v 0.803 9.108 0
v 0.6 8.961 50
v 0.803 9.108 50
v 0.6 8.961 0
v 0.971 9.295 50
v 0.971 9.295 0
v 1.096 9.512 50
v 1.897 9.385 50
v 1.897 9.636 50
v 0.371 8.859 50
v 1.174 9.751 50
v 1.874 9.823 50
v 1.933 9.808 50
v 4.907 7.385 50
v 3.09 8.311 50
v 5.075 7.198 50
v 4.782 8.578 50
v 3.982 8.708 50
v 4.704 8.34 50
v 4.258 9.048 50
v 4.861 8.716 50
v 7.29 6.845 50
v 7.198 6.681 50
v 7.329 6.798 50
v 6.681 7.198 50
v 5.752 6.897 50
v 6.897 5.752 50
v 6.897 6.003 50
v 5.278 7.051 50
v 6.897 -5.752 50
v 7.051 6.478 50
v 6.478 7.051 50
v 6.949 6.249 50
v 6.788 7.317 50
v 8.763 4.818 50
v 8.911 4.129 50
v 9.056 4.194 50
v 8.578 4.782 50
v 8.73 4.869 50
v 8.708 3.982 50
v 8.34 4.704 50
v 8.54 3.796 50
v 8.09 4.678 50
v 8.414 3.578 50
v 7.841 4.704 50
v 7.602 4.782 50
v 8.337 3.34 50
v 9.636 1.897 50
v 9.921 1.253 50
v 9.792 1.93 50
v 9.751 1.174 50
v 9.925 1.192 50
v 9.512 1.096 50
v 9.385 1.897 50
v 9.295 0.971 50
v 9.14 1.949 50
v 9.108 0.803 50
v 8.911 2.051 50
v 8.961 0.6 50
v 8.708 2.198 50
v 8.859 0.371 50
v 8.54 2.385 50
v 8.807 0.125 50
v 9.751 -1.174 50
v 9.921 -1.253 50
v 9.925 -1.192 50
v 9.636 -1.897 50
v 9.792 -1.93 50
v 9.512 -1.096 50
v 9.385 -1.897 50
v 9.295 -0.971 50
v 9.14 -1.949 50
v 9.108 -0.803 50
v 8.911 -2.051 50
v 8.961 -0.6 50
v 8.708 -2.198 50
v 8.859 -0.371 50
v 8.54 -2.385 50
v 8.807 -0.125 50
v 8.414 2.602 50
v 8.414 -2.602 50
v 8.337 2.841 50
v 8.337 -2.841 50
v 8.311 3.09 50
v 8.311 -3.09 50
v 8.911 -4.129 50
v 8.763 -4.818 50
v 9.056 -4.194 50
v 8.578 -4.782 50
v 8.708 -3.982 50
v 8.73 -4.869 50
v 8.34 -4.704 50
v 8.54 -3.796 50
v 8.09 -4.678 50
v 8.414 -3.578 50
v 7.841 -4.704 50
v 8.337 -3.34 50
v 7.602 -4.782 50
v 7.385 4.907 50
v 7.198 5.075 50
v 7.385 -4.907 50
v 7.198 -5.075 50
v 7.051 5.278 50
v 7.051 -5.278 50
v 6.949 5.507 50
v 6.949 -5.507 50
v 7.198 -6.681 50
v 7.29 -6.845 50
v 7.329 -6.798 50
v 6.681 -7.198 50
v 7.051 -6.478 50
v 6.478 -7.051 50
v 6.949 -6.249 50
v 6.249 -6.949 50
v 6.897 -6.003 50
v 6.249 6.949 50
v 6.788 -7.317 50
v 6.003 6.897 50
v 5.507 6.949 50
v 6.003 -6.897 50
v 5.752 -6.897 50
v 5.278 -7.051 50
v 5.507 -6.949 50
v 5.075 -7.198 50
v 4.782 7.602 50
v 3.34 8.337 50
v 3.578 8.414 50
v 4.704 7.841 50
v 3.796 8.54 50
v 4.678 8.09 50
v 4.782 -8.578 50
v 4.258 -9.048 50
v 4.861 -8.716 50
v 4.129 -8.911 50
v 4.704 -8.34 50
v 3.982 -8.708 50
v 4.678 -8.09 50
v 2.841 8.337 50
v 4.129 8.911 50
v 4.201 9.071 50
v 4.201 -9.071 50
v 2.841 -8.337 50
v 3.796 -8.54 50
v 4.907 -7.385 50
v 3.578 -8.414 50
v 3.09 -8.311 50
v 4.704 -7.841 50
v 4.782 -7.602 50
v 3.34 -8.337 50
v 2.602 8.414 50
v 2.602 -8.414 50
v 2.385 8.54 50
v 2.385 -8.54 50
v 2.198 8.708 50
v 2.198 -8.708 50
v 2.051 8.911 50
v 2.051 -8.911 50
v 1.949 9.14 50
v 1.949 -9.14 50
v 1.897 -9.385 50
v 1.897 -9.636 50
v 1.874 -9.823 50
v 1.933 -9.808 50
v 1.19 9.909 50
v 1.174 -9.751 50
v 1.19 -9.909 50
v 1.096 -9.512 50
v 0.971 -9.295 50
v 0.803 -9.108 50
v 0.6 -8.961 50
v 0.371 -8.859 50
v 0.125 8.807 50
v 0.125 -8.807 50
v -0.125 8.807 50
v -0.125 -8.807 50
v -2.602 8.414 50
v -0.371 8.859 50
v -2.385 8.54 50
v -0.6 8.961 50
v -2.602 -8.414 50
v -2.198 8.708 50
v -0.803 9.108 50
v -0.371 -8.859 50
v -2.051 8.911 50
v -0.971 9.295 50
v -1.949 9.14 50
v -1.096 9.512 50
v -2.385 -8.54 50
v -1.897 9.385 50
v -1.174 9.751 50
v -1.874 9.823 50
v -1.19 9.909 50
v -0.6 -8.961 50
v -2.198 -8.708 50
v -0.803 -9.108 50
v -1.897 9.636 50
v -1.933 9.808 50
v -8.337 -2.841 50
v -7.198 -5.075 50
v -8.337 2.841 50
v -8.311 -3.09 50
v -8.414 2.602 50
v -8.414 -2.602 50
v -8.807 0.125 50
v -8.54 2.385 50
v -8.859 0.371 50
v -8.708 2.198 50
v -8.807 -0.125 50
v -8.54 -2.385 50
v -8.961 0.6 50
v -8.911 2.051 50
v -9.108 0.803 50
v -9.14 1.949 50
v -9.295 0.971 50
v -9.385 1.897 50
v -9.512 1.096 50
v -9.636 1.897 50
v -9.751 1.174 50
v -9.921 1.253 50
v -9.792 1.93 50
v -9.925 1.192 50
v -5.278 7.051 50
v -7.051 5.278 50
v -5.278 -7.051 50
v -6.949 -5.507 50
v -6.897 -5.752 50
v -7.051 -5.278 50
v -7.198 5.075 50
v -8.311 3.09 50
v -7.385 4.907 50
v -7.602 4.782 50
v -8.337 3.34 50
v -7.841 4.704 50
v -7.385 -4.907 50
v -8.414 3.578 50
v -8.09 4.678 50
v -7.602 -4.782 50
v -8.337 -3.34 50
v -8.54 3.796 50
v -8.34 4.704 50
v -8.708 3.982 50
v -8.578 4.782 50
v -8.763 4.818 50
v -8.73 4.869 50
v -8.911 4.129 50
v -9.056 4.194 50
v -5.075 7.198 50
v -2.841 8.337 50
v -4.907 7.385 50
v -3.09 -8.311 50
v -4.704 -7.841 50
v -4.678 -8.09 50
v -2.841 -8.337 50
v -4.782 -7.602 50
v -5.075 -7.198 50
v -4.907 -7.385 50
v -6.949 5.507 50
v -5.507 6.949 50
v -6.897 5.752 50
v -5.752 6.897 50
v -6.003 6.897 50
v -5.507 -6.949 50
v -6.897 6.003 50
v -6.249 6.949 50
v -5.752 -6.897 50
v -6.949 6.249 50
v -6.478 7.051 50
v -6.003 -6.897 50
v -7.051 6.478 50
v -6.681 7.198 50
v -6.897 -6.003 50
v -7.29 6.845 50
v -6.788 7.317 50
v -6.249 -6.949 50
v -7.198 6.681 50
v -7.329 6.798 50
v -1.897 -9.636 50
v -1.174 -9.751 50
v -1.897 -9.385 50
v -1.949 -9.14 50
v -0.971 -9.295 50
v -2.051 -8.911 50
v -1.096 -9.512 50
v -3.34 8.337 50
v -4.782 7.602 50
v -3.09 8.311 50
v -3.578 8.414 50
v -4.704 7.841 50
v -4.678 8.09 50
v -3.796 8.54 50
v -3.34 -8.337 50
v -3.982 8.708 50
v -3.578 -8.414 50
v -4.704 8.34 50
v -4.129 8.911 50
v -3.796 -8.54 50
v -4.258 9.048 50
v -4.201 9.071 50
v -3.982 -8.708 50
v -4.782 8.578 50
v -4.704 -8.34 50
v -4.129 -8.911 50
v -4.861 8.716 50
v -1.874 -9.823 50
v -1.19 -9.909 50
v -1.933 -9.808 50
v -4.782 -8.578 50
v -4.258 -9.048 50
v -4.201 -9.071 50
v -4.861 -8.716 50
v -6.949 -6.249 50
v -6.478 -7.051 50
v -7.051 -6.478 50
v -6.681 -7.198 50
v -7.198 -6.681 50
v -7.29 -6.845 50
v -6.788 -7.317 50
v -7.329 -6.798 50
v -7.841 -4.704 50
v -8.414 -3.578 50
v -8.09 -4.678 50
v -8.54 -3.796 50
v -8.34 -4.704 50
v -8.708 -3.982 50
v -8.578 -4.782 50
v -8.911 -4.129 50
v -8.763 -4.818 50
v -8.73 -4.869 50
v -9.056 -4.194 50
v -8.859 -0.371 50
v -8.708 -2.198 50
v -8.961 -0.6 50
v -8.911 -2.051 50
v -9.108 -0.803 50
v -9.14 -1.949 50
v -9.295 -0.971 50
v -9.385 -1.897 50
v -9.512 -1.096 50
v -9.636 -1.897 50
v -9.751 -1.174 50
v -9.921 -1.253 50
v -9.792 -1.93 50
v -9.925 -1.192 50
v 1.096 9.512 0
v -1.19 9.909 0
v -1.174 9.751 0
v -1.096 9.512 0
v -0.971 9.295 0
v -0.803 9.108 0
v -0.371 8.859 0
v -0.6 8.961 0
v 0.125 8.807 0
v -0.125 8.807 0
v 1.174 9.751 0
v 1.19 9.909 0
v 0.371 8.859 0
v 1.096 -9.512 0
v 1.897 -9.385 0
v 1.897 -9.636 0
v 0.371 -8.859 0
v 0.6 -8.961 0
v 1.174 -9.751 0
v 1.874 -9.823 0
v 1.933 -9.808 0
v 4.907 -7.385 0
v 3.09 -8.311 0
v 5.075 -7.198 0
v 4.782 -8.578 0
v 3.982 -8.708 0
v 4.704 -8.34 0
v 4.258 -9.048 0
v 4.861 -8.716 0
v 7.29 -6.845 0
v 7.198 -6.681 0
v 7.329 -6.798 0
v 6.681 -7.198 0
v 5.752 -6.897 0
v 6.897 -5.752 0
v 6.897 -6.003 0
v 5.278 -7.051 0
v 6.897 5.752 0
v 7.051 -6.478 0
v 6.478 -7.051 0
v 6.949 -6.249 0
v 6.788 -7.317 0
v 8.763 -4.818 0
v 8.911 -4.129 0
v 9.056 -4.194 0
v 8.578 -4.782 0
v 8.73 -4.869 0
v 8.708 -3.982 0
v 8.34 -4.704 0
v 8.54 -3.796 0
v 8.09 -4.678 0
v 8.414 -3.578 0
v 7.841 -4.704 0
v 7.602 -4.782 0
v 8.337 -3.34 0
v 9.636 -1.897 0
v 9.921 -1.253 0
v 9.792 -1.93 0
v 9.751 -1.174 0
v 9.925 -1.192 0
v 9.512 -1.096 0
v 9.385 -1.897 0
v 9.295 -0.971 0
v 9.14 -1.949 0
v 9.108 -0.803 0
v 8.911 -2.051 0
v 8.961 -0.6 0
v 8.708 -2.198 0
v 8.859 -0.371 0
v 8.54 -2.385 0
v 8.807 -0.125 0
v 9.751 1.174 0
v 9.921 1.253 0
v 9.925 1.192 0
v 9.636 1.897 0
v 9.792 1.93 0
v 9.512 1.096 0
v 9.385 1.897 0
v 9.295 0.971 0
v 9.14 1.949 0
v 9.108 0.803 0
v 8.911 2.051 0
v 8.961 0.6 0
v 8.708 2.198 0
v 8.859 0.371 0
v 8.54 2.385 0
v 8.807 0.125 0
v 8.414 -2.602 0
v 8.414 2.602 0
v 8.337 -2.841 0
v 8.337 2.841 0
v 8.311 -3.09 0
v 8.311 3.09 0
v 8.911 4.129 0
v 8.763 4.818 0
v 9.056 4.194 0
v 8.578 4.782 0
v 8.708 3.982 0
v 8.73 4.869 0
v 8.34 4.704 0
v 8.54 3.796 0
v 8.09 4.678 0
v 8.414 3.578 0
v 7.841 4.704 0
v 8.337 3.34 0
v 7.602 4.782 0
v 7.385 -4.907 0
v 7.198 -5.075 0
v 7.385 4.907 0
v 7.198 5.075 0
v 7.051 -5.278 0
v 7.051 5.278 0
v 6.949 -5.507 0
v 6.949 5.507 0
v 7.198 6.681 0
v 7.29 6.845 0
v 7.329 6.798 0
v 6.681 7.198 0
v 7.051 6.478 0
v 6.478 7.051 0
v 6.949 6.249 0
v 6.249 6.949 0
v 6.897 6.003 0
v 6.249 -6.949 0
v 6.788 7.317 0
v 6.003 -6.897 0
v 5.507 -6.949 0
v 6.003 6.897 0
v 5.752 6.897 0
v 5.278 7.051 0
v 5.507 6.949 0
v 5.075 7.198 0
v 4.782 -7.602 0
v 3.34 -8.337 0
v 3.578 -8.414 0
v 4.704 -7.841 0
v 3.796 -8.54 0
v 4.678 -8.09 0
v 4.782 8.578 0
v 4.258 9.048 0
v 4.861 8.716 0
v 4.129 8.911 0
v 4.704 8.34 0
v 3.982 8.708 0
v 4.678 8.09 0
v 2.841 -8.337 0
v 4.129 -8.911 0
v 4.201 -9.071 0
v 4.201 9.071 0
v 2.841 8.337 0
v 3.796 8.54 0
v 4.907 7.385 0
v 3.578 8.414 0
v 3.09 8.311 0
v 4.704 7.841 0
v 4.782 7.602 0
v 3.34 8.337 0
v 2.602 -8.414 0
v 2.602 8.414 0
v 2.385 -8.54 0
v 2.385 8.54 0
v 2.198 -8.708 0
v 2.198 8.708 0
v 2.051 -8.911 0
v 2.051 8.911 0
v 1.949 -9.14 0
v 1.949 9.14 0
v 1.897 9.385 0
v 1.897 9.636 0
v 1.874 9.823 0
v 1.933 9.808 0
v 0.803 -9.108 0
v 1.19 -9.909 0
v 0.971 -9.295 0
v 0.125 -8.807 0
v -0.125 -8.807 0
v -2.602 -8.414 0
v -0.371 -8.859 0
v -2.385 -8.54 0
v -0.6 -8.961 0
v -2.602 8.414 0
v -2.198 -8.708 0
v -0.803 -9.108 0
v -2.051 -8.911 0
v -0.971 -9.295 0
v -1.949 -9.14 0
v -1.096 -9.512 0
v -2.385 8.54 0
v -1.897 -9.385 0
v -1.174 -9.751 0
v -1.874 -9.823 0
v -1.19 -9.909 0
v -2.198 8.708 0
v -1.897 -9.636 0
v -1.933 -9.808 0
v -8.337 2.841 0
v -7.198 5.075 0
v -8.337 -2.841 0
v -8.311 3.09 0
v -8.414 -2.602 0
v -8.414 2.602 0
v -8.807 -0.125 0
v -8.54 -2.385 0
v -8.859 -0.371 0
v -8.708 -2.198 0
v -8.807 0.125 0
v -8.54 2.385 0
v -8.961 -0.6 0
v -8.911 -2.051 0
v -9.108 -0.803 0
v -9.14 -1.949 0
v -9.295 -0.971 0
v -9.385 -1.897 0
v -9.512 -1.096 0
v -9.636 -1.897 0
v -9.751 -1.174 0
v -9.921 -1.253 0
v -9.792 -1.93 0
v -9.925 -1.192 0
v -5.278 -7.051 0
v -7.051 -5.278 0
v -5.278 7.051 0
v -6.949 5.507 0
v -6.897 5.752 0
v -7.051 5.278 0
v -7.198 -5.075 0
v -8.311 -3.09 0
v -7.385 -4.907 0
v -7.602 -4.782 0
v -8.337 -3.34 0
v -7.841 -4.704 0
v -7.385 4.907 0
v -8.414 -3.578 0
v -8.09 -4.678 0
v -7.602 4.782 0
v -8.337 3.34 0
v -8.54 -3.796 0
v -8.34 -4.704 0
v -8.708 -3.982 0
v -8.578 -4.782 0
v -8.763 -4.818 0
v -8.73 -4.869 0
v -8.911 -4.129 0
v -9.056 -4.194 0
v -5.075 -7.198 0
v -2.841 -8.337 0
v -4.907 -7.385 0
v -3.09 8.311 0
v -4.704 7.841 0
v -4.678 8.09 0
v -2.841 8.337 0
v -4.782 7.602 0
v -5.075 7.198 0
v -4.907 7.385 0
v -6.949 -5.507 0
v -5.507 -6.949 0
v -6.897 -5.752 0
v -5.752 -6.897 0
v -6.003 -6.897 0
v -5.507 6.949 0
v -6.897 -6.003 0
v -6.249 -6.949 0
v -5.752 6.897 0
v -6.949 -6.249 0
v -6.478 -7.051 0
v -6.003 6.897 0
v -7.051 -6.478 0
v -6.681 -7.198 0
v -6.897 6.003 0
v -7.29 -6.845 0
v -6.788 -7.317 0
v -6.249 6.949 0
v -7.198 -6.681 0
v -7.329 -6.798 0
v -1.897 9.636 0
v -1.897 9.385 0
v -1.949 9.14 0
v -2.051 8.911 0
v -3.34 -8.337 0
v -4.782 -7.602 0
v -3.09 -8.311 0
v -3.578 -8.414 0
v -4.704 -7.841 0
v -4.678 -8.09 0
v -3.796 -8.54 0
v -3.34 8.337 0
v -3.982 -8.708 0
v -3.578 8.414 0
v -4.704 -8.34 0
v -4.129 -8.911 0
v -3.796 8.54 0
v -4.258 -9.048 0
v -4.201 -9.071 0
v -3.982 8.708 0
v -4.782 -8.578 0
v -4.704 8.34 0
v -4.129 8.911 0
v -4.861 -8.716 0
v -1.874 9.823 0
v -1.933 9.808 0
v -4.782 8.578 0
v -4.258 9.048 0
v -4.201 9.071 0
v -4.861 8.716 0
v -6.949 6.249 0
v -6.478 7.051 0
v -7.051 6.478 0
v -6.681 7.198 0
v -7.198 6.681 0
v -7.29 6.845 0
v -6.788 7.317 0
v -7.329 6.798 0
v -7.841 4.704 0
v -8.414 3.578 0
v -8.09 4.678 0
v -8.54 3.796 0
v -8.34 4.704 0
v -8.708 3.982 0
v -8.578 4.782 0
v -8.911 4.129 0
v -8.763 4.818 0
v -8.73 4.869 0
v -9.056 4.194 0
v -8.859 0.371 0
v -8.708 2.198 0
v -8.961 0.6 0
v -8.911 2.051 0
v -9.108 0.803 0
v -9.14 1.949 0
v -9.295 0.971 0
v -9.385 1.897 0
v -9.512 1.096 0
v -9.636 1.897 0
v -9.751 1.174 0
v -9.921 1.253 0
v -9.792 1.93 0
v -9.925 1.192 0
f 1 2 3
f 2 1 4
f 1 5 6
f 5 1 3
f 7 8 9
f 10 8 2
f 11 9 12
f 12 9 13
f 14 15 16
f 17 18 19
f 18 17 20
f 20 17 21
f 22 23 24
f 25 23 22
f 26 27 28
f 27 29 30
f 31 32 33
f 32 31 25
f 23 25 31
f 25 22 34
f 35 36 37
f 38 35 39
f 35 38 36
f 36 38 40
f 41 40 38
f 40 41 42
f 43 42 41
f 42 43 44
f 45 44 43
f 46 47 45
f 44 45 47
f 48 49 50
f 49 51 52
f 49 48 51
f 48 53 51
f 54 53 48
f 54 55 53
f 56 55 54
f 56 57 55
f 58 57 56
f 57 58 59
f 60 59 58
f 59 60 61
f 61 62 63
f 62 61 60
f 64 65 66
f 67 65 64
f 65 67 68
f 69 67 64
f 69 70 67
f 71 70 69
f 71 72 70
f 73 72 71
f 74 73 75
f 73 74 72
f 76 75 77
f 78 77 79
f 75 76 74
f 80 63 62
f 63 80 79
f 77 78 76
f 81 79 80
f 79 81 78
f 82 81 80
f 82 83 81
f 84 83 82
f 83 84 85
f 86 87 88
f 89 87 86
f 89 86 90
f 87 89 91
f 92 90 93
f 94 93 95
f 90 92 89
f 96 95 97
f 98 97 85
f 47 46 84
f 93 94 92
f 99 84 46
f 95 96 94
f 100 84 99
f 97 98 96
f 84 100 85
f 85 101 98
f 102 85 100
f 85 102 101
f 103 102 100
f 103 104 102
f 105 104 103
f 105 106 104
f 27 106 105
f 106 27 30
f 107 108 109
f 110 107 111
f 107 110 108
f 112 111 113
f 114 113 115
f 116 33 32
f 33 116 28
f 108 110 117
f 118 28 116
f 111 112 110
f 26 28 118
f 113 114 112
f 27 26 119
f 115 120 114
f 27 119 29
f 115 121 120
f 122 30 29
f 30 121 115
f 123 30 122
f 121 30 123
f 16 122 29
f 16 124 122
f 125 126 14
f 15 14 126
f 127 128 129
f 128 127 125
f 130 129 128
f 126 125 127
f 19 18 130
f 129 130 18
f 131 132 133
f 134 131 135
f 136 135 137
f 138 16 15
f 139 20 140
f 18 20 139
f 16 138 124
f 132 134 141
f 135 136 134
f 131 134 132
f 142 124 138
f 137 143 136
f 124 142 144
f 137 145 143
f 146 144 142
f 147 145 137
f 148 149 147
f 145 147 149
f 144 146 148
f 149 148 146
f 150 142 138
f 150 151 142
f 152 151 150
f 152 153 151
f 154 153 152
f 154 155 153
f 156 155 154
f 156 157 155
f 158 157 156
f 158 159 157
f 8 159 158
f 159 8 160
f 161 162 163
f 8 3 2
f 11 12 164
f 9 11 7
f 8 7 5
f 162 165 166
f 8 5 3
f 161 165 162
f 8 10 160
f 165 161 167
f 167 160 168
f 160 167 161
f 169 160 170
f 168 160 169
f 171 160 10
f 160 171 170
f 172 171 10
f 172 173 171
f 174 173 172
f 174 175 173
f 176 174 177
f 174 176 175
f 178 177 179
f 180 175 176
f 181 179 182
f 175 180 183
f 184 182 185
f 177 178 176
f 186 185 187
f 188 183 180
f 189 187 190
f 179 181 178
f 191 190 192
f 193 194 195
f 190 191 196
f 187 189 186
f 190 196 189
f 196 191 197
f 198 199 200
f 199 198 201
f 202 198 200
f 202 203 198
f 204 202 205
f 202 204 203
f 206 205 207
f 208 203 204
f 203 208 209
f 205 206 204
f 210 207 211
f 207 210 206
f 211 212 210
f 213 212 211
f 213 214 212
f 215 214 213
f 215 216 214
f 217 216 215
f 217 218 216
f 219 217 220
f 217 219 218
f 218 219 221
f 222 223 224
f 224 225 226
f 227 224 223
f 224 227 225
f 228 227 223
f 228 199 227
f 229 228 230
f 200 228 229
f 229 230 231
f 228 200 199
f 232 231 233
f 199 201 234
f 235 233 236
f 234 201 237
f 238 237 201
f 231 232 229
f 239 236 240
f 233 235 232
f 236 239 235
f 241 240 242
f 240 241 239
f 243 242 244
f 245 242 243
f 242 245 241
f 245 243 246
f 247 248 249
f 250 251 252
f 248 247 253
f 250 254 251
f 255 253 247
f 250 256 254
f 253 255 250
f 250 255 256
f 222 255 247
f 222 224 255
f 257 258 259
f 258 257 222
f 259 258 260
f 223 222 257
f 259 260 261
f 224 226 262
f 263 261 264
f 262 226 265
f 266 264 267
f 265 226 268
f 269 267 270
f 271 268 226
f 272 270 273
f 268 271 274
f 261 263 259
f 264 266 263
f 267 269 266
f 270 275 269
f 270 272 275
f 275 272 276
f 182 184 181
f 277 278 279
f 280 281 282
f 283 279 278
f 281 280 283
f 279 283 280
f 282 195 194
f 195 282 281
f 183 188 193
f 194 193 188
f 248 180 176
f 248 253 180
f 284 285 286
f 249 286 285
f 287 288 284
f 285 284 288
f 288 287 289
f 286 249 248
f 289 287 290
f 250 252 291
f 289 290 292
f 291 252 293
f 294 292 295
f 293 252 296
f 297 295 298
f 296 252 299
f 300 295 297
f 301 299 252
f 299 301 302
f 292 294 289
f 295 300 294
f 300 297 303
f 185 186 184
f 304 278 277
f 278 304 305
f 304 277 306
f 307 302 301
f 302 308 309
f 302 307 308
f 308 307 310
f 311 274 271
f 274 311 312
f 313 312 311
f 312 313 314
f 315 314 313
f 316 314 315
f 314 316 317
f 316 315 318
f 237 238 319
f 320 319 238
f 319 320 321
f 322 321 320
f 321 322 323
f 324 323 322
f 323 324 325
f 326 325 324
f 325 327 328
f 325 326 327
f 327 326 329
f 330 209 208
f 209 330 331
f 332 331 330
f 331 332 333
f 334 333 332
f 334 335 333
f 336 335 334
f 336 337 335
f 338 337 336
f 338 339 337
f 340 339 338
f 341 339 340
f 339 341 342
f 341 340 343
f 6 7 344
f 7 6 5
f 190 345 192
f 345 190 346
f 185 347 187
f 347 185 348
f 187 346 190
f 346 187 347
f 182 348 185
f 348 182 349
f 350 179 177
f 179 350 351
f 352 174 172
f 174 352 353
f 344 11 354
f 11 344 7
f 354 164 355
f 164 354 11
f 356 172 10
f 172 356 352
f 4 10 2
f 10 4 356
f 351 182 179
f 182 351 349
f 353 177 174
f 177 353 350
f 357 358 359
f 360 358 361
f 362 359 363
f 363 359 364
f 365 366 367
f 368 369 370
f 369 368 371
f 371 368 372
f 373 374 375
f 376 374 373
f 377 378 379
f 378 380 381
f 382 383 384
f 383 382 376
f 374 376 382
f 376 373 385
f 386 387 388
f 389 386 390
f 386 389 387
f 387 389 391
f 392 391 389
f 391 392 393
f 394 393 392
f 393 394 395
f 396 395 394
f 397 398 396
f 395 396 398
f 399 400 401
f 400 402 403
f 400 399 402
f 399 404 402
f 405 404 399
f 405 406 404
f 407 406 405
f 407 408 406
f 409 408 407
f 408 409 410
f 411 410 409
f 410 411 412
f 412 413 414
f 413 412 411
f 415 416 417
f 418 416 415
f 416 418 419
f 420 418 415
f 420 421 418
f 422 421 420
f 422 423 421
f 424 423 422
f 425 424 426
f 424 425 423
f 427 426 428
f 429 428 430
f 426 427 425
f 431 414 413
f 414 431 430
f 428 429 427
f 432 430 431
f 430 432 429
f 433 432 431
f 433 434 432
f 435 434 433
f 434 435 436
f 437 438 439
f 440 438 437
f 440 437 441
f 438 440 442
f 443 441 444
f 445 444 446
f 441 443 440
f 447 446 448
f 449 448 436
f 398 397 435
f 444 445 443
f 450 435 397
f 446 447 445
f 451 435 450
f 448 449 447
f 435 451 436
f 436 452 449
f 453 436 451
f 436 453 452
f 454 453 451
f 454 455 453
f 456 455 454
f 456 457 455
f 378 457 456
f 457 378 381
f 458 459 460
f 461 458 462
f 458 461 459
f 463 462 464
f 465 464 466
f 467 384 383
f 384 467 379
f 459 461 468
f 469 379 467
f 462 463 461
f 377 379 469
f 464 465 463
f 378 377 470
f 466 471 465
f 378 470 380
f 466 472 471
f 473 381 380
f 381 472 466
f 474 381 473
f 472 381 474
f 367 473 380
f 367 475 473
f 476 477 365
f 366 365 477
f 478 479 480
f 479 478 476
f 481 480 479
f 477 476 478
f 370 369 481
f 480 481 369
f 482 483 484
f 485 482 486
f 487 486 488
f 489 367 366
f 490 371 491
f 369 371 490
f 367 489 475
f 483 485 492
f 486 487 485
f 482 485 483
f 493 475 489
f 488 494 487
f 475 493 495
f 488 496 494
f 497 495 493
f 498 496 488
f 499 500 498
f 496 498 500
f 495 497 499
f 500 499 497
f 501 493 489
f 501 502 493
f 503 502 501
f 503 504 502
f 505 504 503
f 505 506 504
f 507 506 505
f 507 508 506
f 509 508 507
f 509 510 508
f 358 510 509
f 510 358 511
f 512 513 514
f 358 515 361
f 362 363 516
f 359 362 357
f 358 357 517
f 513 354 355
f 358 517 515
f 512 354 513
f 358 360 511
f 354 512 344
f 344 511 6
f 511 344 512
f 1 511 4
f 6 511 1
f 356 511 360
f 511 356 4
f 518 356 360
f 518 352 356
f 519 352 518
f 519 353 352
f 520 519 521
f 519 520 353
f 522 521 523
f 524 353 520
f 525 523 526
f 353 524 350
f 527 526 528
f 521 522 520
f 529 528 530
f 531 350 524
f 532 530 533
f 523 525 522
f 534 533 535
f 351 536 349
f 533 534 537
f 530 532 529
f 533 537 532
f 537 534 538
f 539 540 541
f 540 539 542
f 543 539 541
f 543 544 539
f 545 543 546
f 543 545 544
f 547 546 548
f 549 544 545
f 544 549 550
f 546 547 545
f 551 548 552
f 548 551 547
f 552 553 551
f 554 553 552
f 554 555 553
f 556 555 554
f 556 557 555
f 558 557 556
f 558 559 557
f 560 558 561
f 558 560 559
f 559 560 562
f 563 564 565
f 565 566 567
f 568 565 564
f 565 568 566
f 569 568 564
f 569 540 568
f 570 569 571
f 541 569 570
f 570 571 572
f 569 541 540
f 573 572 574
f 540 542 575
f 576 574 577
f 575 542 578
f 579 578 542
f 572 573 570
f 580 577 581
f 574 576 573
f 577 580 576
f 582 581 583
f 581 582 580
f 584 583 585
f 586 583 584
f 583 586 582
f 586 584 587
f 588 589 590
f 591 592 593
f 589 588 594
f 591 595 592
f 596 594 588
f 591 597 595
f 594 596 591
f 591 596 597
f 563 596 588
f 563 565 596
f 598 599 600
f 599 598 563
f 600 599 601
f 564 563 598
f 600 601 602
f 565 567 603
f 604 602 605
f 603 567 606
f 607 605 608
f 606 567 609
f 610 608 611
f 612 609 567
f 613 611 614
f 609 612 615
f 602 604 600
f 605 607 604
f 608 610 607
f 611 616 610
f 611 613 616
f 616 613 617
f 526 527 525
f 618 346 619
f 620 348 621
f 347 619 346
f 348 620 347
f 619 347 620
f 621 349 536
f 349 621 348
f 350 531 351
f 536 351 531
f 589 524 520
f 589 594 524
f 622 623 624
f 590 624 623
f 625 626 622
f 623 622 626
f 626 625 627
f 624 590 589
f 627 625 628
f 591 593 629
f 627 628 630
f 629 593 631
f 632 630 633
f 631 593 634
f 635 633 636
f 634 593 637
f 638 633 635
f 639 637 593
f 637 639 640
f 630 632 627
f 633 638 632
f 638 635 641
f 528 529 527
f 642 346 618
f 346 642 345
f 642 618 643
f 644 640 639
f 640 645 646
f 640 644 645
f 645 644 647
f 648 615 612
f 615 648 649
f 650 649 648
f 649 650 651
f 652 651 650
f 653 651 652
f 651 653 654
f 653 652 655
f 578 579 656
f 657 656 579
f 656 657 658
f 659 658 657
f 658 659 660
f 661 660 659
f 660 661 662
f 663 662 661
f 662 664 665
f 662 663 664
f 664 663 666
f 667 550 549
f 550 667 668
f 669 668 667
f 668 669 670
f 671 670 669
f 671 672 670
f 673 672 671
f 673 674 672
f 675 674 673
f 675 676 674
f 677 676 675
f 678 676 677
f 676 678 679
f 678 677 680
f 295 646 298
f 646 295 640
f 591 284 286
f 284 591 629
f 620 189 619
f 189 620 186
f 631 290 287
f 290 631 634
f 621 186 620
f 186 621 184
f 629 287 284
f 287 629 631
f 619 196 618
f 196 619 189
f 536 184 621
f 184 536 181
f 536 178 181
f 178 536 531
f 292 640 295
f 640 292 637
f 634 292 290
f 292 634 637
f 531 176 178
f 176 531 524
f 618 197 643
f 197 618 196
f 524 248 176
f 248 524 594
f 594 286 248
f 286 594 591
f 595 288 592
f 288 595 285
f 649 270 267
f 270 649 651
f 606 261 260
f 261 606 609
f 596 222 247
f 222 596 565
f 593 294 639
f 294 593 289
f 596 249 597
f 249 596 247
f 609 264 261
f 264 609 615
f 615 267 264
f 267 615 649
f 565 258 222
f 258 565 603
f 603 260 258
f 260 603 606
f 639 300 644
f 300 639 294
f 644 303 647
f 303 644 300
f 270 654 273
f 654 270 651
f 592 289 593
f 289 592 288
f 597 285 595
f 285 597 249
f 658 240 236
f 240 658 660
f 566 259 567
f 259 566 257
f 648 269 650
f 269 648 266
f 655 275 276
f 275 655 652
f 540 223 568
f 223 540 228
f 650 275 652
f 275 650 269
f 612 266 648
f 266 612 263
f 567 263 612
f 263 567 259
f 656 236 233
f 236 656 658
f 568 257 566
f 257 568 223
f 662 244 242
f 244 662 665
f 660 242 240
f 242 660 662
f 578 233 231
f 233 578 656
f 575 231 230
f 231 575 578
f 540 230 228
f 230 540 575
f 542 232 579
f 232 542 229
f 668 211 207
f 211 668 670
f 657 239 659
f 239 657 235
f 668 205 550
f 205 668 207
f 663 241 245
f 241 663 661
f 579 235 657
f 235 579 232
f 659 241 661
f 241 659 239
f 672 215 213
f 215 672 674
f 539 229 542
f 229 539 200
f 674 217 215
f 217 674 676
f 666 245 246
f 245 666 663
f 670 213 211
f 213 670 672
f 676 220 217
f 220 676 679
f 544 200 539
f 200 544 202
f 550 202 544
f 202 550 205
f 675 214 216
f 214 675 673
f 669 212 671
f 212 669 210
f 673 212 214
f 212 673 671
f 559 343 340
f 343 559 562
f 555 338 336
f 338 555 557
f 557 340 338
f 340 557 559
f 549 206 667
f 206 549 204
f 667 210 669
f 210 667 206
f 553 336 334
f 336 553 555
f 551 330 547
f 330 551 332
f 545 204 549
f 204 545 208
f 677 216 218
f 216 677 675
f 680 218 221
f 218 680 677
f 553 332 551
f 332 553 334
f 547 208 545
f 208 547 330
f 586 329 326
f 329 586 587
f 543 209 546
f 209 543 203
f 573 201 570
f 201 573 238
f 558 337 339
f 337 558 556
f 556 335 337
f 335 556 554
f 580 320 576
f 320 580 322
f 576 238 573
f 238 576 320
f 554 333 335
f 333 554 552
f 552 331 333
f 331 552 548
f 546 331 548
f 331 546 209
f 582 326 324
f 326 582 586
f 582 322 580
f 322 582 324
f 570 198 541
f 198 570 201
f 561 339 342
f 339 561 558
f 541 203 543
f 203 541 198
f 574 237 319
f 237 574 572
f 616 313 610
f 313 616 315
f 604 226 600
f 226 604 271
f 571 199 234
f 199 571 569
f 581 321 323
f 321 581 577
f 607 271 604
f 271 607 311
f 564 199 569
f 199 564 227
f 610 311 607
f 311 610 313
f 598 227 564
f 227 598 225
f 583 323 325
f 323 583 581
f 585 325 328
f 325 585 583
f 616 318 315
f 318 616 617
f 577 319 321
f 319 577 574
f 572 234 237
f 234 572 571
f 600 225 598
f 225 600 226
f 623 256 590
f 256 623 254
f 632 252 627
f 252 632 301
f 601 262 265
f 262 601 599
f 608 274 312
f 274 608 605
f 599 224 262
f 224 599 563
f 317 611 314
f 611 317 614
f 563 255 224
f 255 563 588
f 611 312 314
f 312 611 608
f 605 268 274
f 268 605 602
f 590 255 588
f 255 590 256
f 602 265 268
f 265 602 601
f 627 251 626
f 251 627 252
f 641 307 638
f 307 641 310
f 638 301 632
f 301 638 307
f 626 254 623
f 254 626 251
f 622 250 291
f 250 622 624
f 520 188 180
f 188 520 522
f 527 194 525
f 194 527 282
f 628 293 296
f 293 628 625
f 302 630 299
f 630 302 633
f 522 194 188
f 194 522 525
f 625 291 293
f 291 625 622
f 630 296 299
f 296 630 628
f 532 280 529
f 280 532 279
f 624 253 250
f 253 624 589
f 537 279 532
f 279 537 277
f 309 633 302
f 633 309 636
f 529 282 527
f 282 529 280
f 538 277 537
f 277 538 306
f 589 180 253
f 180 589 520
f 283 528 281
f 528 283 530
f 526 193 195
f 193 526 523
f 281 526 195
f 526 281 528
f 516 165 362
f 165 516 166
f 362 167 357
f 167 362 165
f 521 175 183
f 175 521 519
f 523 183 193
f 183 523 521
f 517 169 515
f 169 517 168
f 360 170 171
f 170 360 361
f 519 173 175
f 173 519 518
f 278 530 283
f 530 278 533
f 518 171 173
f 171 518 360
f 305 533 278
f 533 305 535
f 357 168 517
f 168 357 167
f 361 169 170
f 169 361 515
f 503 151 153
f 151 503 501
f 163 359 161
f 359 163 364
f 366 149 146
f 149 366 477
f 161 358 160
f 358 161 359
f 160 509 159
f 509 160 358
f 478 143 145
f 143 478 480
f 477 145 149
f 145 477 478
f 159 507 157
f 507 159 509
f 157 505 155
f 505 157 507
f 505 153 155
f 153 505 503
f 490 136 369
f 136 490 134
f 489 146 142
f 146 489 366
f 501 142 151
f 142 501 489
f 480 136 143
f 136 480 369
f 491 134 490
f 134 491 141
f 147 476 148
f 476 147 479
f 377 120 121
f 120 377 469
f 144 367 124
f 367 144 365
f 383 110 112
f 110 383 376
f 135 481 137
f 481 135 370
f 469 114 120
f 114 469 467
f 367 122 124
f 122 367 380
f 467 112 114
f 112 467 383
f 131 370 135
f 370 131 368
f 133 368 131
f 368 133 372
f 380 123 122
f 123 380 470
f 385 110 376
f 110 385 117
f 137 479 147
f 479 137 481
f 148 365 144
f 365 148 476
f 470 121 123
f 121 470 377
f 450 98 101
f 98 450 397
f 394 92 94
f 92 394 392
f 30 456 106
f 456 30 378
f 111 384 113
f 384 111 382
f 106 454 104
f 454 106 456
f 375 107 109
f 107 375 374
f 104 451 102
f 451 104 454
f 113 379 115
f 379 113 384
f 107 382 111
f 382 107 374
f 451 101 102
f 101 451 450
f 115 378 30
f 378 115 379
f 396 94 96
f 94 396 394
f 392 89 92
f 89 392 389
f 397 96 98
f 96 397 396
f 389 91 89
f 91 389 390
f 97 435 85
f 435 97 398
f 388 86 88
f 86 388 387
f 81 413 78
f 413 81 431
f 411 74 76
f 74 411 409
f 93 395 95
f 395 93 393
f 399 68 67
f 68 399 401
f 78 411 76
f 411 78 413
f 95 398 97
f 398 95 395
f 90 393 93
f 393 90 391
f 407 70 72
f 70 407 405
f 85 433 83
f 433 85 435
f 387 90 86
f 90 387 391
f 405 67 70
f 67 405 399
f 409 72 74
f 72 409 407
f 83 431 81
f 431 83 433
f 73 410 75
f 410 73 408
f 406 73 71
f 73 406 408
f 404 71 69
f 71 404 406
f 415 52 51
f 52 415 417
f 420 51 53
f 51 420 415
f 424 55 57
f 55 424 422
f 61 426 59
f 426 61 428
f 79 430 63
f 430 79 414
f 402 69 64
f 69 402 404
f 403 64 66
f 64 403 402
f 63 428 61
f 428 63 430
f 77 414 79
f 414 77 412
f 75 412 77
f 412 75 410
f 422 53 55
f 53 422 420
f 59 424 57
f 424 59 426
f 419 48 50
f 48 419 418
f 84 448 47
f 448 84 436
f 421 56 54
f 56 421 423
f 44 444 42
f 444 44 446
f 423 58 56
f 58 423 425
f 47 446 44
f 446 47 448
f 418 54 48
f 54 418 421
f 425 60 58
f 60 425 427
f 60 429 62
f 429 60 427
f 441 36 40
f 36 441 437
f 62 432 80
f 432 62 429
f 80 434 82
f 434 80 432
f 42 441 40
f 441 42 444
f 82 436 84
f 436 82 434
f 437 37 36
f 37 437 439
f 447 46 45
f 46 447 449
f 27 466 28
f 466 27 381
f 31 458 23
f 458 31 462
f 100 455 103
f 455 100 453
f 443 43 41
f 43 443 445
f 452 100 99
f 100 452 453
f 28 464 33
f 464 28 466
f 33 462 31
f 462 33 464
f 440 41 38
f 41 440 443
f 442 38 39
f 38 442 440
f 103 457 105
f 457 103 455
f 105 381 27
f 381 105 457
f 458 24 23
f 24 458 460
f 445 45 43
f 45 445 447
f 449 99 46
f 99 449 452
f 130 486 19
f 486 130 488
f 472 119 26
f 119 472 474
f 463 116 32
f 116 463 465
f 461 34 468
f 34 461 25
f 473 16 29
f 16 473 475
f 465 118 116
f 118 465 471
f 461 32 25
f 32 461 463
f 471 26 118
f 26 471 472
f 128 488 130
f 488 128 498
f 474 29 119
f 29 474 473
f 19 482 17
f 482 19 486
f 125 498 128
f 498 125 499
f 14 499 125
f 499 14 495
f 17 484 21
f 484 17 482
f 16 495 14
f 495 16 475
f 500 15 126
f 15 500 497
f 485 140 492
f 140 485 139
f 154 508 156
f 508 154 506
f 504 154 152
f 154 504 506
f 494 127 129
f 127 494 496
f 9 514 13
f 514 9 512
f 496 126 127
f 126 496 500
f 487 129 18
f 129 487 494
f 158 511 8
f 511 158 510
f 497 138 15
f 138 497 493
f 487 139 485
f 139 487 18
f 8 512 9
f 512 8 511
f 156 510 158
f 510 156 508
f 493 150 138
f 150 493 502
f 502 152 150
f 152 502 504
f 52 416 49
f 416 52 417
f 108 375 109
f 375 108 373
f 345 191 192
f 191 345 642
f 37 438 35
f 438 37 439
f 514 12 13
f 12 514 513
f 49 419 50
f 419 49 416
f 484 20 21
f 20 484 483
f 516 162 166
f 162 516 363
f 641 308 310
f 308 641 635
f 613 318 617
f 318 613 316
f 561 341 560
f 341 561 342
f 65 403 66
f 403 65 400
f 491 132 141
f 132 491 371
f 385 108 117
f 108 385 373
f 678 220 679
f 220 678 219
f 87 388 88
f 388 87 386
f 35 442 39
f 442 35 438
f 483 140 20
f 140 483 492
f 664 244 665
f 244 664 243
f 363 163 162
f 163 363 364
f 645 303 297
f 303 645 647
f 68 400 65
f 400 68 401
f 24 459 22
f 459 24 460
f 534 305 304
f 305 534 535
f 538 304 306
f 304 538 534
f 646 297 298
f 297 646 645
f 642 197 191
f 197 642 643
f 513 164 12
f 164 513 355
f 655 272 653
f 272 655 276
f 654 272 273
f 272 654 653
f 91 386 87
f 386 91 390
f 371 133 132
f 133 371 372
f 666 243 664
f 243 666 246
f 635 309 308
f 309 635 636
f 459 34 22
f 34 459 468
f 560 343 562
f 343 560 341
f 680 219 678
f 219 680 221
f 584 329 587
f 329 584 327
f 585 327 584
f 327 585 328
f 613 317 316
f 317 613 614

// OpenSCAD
module columnShaft(radius = 10, height = 50){
    radiusFluted = radius/10*1.2;
    difference(){
        cylinder(r = radius, h = height, $fn = 50);
        for( i = [0:19] ){
            rotate(360/20. *i, [0, 0, 1]){
                translate([0, radius, 0]){
                        cylinder(r = radiusFluted, h = height, $fn = 30);
                }
            }
        }
    }
}

columnShaft();
